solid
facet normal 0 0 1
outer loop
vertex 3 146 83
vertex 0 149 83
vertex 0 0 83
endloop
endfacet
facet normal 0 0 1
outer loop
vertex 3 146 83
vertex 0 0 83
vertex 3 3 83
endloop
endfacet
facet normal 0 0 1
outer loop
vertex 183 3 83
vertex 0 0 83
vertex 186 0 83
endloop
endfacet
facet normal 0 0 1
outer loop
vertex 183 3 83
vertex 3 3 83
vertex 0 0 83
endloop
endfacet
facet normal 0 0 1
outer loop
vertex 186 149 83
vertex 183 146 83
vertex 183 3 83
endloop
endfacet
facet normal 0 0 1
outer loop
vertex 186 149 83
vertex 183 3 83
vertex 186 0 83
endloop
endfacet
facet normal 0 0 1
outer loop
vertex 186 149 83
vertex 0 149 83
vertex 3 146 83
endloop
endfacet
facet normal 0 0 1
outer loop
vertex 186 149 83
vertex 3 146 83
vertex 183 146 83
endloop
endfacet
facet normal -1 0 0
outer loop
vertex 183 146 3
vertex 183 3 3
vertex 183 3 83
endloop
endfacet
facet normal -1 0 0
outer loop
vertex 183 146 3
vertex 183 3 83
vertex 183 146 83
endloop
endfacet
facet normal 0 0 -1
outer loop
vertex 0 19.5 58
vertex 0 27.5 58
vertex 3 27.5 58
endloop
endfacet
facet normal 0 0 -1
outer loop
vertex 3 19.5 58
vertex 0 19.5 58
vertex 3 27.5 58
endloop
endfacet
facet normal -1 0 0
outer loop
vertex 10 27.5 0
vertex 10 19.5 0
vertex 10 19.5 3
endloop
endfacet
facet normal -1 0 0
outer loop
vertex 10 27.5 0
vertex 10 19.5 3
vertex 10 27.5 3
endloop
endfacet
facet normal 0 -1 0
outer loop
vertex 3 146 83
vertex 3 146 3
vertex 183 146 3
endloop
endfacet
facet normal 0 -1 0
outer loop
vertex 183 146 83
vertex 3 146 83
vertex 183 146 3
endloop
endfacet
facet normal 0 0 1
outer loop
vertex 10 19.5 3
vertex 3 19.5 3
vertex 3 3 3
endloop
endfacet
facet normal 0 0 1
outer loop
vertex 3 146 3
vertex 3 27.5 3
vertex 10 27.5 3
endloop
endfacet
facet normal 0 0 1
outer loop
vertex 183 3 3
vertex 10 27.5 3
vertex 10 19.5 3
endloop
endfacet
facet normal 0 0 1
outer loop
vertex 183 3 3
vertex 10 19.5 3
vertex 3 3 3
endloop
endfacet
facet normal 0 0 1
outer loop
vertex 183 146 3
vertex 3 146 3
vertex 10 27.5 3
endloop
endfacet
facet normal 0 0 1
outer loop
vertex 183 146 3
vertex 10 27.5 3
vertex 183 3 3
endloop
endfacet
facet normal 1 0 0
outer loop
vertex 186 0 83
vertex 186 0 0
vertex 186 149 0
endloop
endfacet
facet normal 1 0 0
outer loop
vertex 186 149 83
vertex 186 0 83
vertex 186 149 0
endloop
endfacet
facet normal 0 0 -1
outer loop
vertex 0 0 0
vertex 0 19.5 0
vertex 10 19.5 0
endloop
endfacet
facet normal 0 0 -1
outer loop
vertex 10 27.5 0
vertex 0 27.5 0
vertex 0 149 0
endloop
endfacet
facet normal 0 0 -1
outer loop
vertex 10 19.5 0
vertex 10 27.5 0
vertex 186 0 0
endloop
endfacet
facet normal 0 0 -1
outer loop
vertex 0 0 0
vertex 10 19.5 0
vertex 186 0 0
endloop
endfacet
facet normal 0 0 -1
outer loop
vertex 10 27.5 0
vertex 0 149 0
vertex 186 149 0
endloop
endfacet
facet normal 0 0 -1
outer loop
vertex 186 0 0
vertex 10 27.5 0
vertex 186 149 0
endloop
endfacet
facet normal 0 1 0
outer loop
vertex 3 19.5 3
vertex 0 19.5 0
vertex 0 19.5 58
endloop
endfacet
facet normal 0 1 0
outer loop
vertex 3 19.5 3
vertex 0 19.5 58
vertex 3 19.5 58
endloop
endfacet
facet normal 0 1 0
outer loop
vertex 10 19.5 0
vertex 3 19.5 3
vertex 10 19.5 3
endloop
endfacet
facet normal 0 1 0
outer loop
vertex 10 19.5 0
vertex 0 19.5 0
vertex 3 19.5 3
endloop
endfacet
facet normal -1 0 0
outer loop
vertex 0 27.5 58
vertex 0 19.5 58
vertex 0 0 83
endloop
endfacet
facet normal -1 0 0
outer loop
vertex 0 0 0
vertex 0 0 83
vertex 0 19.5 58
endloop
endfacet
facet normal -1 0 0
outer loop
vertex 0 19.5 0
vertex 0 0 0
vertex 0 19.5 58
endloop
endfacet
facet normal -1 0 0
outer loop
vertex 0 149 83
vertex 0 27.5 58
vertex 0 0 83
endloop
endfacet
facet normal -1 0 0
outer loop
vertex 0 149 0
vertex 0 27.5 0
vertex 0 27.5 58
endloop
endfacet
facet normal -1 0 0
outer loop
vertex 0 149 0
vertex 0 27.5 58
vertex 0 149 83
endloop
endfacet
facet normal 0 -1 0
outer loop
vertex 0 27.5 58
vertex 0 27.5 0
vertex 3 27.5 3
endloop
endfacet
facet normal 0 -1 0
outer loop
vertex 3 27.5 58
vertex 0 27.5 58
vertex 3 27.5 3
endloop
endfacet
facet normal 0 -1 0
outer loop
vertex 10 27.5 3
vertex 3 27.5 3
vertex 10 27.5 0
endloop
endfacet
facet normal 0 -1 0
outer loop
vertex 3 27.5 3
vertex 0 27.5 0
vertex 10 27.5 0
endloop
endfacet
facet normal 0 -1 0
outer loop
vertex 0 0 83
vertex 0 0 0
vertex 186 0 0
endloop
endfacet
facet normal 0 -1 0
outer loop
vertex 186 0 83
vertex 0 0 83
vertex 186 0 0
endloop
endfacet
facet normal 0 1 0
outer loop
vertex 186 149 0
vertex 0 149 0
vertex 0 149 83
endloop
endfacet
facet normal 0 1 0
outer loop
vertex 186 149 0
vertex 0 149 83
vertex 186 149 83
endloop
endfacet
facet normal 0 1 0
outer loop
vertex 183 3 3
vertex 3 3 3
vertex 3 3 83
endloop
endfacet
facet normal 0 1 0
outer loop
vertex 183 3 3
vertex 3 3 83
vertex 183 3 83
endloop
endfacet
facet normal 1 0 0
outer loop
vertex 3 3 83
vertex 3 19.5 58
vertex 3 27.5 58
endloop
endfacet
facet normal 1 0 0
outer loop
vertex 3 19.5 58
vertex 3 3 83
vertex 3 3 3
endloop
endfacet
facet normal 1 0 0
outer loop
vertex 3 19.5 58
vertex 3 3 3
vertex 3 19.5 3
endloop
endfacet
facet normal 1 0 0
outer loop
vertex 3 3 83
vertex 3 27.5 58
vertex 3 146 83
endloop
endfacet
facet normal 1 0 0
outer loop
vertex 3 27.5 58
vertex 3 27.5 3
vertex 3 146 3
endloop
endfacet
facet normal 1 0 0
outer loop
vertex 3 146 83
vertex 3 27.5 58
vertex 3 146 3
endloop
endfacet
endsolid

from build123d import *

# Parameters (mm, degrees)
SKETCH_1_W                      = 186
SKETCH_1_H                      = 149
FLOOR_T3_DEPTH                  = 3
SKETCH_2_W                      = 186
SKETCH_2_H                      = 149
SKETCH_2_W_2                    = 180
SKETCH_2_H_2                    = 143
WALLS_T3_DEPTH80_DEPTH          = 83
SKETCH_3_W                      = 11
SKETCH_3_H                      = 8
SERVO_STAND_RELIEF_W8_H58_DEPTH = 58


with BuildPart() as part:
    # 草图1 → Floor_T3 (new body)
    with BuildSketch(Plane.XY):
        with Locations((93, 74.5)):
            Rectangle(SKETCH_1_W, SKETCH_1_H)
    extrude(amount=FLOOR_T3_DEPTH)

    # 草图2 → Walls_T3_depth80 (add)
    with BuildSketch(Plane.XY):
        with Locations((93, 74.5)):
            Rectangle(SKETCH_2_W, SKETCH_2_H)
        with Locations((93, 74.5)):
            Rectangle(SKETCH_2_W_2, SKETCH_2_H_2, mode=Mode.SUBTRACT)
    extrude(amount=WALLS_T3_DEPTH80_DEPTH)

    # 草图3 → Servo_stand_relief_W8_H58 (cut)
    with BuildSketch(Plane.XY):
        with Locations((4.5, 23.5)):
            Rectangle(SKETCH_3_W, SKETCH_3_H)
    extrude(amount=SERVO_STAND_RELIEF_W8_H58_DEPTH, mode=Mode.SUBTRACT)


solid = part.part
